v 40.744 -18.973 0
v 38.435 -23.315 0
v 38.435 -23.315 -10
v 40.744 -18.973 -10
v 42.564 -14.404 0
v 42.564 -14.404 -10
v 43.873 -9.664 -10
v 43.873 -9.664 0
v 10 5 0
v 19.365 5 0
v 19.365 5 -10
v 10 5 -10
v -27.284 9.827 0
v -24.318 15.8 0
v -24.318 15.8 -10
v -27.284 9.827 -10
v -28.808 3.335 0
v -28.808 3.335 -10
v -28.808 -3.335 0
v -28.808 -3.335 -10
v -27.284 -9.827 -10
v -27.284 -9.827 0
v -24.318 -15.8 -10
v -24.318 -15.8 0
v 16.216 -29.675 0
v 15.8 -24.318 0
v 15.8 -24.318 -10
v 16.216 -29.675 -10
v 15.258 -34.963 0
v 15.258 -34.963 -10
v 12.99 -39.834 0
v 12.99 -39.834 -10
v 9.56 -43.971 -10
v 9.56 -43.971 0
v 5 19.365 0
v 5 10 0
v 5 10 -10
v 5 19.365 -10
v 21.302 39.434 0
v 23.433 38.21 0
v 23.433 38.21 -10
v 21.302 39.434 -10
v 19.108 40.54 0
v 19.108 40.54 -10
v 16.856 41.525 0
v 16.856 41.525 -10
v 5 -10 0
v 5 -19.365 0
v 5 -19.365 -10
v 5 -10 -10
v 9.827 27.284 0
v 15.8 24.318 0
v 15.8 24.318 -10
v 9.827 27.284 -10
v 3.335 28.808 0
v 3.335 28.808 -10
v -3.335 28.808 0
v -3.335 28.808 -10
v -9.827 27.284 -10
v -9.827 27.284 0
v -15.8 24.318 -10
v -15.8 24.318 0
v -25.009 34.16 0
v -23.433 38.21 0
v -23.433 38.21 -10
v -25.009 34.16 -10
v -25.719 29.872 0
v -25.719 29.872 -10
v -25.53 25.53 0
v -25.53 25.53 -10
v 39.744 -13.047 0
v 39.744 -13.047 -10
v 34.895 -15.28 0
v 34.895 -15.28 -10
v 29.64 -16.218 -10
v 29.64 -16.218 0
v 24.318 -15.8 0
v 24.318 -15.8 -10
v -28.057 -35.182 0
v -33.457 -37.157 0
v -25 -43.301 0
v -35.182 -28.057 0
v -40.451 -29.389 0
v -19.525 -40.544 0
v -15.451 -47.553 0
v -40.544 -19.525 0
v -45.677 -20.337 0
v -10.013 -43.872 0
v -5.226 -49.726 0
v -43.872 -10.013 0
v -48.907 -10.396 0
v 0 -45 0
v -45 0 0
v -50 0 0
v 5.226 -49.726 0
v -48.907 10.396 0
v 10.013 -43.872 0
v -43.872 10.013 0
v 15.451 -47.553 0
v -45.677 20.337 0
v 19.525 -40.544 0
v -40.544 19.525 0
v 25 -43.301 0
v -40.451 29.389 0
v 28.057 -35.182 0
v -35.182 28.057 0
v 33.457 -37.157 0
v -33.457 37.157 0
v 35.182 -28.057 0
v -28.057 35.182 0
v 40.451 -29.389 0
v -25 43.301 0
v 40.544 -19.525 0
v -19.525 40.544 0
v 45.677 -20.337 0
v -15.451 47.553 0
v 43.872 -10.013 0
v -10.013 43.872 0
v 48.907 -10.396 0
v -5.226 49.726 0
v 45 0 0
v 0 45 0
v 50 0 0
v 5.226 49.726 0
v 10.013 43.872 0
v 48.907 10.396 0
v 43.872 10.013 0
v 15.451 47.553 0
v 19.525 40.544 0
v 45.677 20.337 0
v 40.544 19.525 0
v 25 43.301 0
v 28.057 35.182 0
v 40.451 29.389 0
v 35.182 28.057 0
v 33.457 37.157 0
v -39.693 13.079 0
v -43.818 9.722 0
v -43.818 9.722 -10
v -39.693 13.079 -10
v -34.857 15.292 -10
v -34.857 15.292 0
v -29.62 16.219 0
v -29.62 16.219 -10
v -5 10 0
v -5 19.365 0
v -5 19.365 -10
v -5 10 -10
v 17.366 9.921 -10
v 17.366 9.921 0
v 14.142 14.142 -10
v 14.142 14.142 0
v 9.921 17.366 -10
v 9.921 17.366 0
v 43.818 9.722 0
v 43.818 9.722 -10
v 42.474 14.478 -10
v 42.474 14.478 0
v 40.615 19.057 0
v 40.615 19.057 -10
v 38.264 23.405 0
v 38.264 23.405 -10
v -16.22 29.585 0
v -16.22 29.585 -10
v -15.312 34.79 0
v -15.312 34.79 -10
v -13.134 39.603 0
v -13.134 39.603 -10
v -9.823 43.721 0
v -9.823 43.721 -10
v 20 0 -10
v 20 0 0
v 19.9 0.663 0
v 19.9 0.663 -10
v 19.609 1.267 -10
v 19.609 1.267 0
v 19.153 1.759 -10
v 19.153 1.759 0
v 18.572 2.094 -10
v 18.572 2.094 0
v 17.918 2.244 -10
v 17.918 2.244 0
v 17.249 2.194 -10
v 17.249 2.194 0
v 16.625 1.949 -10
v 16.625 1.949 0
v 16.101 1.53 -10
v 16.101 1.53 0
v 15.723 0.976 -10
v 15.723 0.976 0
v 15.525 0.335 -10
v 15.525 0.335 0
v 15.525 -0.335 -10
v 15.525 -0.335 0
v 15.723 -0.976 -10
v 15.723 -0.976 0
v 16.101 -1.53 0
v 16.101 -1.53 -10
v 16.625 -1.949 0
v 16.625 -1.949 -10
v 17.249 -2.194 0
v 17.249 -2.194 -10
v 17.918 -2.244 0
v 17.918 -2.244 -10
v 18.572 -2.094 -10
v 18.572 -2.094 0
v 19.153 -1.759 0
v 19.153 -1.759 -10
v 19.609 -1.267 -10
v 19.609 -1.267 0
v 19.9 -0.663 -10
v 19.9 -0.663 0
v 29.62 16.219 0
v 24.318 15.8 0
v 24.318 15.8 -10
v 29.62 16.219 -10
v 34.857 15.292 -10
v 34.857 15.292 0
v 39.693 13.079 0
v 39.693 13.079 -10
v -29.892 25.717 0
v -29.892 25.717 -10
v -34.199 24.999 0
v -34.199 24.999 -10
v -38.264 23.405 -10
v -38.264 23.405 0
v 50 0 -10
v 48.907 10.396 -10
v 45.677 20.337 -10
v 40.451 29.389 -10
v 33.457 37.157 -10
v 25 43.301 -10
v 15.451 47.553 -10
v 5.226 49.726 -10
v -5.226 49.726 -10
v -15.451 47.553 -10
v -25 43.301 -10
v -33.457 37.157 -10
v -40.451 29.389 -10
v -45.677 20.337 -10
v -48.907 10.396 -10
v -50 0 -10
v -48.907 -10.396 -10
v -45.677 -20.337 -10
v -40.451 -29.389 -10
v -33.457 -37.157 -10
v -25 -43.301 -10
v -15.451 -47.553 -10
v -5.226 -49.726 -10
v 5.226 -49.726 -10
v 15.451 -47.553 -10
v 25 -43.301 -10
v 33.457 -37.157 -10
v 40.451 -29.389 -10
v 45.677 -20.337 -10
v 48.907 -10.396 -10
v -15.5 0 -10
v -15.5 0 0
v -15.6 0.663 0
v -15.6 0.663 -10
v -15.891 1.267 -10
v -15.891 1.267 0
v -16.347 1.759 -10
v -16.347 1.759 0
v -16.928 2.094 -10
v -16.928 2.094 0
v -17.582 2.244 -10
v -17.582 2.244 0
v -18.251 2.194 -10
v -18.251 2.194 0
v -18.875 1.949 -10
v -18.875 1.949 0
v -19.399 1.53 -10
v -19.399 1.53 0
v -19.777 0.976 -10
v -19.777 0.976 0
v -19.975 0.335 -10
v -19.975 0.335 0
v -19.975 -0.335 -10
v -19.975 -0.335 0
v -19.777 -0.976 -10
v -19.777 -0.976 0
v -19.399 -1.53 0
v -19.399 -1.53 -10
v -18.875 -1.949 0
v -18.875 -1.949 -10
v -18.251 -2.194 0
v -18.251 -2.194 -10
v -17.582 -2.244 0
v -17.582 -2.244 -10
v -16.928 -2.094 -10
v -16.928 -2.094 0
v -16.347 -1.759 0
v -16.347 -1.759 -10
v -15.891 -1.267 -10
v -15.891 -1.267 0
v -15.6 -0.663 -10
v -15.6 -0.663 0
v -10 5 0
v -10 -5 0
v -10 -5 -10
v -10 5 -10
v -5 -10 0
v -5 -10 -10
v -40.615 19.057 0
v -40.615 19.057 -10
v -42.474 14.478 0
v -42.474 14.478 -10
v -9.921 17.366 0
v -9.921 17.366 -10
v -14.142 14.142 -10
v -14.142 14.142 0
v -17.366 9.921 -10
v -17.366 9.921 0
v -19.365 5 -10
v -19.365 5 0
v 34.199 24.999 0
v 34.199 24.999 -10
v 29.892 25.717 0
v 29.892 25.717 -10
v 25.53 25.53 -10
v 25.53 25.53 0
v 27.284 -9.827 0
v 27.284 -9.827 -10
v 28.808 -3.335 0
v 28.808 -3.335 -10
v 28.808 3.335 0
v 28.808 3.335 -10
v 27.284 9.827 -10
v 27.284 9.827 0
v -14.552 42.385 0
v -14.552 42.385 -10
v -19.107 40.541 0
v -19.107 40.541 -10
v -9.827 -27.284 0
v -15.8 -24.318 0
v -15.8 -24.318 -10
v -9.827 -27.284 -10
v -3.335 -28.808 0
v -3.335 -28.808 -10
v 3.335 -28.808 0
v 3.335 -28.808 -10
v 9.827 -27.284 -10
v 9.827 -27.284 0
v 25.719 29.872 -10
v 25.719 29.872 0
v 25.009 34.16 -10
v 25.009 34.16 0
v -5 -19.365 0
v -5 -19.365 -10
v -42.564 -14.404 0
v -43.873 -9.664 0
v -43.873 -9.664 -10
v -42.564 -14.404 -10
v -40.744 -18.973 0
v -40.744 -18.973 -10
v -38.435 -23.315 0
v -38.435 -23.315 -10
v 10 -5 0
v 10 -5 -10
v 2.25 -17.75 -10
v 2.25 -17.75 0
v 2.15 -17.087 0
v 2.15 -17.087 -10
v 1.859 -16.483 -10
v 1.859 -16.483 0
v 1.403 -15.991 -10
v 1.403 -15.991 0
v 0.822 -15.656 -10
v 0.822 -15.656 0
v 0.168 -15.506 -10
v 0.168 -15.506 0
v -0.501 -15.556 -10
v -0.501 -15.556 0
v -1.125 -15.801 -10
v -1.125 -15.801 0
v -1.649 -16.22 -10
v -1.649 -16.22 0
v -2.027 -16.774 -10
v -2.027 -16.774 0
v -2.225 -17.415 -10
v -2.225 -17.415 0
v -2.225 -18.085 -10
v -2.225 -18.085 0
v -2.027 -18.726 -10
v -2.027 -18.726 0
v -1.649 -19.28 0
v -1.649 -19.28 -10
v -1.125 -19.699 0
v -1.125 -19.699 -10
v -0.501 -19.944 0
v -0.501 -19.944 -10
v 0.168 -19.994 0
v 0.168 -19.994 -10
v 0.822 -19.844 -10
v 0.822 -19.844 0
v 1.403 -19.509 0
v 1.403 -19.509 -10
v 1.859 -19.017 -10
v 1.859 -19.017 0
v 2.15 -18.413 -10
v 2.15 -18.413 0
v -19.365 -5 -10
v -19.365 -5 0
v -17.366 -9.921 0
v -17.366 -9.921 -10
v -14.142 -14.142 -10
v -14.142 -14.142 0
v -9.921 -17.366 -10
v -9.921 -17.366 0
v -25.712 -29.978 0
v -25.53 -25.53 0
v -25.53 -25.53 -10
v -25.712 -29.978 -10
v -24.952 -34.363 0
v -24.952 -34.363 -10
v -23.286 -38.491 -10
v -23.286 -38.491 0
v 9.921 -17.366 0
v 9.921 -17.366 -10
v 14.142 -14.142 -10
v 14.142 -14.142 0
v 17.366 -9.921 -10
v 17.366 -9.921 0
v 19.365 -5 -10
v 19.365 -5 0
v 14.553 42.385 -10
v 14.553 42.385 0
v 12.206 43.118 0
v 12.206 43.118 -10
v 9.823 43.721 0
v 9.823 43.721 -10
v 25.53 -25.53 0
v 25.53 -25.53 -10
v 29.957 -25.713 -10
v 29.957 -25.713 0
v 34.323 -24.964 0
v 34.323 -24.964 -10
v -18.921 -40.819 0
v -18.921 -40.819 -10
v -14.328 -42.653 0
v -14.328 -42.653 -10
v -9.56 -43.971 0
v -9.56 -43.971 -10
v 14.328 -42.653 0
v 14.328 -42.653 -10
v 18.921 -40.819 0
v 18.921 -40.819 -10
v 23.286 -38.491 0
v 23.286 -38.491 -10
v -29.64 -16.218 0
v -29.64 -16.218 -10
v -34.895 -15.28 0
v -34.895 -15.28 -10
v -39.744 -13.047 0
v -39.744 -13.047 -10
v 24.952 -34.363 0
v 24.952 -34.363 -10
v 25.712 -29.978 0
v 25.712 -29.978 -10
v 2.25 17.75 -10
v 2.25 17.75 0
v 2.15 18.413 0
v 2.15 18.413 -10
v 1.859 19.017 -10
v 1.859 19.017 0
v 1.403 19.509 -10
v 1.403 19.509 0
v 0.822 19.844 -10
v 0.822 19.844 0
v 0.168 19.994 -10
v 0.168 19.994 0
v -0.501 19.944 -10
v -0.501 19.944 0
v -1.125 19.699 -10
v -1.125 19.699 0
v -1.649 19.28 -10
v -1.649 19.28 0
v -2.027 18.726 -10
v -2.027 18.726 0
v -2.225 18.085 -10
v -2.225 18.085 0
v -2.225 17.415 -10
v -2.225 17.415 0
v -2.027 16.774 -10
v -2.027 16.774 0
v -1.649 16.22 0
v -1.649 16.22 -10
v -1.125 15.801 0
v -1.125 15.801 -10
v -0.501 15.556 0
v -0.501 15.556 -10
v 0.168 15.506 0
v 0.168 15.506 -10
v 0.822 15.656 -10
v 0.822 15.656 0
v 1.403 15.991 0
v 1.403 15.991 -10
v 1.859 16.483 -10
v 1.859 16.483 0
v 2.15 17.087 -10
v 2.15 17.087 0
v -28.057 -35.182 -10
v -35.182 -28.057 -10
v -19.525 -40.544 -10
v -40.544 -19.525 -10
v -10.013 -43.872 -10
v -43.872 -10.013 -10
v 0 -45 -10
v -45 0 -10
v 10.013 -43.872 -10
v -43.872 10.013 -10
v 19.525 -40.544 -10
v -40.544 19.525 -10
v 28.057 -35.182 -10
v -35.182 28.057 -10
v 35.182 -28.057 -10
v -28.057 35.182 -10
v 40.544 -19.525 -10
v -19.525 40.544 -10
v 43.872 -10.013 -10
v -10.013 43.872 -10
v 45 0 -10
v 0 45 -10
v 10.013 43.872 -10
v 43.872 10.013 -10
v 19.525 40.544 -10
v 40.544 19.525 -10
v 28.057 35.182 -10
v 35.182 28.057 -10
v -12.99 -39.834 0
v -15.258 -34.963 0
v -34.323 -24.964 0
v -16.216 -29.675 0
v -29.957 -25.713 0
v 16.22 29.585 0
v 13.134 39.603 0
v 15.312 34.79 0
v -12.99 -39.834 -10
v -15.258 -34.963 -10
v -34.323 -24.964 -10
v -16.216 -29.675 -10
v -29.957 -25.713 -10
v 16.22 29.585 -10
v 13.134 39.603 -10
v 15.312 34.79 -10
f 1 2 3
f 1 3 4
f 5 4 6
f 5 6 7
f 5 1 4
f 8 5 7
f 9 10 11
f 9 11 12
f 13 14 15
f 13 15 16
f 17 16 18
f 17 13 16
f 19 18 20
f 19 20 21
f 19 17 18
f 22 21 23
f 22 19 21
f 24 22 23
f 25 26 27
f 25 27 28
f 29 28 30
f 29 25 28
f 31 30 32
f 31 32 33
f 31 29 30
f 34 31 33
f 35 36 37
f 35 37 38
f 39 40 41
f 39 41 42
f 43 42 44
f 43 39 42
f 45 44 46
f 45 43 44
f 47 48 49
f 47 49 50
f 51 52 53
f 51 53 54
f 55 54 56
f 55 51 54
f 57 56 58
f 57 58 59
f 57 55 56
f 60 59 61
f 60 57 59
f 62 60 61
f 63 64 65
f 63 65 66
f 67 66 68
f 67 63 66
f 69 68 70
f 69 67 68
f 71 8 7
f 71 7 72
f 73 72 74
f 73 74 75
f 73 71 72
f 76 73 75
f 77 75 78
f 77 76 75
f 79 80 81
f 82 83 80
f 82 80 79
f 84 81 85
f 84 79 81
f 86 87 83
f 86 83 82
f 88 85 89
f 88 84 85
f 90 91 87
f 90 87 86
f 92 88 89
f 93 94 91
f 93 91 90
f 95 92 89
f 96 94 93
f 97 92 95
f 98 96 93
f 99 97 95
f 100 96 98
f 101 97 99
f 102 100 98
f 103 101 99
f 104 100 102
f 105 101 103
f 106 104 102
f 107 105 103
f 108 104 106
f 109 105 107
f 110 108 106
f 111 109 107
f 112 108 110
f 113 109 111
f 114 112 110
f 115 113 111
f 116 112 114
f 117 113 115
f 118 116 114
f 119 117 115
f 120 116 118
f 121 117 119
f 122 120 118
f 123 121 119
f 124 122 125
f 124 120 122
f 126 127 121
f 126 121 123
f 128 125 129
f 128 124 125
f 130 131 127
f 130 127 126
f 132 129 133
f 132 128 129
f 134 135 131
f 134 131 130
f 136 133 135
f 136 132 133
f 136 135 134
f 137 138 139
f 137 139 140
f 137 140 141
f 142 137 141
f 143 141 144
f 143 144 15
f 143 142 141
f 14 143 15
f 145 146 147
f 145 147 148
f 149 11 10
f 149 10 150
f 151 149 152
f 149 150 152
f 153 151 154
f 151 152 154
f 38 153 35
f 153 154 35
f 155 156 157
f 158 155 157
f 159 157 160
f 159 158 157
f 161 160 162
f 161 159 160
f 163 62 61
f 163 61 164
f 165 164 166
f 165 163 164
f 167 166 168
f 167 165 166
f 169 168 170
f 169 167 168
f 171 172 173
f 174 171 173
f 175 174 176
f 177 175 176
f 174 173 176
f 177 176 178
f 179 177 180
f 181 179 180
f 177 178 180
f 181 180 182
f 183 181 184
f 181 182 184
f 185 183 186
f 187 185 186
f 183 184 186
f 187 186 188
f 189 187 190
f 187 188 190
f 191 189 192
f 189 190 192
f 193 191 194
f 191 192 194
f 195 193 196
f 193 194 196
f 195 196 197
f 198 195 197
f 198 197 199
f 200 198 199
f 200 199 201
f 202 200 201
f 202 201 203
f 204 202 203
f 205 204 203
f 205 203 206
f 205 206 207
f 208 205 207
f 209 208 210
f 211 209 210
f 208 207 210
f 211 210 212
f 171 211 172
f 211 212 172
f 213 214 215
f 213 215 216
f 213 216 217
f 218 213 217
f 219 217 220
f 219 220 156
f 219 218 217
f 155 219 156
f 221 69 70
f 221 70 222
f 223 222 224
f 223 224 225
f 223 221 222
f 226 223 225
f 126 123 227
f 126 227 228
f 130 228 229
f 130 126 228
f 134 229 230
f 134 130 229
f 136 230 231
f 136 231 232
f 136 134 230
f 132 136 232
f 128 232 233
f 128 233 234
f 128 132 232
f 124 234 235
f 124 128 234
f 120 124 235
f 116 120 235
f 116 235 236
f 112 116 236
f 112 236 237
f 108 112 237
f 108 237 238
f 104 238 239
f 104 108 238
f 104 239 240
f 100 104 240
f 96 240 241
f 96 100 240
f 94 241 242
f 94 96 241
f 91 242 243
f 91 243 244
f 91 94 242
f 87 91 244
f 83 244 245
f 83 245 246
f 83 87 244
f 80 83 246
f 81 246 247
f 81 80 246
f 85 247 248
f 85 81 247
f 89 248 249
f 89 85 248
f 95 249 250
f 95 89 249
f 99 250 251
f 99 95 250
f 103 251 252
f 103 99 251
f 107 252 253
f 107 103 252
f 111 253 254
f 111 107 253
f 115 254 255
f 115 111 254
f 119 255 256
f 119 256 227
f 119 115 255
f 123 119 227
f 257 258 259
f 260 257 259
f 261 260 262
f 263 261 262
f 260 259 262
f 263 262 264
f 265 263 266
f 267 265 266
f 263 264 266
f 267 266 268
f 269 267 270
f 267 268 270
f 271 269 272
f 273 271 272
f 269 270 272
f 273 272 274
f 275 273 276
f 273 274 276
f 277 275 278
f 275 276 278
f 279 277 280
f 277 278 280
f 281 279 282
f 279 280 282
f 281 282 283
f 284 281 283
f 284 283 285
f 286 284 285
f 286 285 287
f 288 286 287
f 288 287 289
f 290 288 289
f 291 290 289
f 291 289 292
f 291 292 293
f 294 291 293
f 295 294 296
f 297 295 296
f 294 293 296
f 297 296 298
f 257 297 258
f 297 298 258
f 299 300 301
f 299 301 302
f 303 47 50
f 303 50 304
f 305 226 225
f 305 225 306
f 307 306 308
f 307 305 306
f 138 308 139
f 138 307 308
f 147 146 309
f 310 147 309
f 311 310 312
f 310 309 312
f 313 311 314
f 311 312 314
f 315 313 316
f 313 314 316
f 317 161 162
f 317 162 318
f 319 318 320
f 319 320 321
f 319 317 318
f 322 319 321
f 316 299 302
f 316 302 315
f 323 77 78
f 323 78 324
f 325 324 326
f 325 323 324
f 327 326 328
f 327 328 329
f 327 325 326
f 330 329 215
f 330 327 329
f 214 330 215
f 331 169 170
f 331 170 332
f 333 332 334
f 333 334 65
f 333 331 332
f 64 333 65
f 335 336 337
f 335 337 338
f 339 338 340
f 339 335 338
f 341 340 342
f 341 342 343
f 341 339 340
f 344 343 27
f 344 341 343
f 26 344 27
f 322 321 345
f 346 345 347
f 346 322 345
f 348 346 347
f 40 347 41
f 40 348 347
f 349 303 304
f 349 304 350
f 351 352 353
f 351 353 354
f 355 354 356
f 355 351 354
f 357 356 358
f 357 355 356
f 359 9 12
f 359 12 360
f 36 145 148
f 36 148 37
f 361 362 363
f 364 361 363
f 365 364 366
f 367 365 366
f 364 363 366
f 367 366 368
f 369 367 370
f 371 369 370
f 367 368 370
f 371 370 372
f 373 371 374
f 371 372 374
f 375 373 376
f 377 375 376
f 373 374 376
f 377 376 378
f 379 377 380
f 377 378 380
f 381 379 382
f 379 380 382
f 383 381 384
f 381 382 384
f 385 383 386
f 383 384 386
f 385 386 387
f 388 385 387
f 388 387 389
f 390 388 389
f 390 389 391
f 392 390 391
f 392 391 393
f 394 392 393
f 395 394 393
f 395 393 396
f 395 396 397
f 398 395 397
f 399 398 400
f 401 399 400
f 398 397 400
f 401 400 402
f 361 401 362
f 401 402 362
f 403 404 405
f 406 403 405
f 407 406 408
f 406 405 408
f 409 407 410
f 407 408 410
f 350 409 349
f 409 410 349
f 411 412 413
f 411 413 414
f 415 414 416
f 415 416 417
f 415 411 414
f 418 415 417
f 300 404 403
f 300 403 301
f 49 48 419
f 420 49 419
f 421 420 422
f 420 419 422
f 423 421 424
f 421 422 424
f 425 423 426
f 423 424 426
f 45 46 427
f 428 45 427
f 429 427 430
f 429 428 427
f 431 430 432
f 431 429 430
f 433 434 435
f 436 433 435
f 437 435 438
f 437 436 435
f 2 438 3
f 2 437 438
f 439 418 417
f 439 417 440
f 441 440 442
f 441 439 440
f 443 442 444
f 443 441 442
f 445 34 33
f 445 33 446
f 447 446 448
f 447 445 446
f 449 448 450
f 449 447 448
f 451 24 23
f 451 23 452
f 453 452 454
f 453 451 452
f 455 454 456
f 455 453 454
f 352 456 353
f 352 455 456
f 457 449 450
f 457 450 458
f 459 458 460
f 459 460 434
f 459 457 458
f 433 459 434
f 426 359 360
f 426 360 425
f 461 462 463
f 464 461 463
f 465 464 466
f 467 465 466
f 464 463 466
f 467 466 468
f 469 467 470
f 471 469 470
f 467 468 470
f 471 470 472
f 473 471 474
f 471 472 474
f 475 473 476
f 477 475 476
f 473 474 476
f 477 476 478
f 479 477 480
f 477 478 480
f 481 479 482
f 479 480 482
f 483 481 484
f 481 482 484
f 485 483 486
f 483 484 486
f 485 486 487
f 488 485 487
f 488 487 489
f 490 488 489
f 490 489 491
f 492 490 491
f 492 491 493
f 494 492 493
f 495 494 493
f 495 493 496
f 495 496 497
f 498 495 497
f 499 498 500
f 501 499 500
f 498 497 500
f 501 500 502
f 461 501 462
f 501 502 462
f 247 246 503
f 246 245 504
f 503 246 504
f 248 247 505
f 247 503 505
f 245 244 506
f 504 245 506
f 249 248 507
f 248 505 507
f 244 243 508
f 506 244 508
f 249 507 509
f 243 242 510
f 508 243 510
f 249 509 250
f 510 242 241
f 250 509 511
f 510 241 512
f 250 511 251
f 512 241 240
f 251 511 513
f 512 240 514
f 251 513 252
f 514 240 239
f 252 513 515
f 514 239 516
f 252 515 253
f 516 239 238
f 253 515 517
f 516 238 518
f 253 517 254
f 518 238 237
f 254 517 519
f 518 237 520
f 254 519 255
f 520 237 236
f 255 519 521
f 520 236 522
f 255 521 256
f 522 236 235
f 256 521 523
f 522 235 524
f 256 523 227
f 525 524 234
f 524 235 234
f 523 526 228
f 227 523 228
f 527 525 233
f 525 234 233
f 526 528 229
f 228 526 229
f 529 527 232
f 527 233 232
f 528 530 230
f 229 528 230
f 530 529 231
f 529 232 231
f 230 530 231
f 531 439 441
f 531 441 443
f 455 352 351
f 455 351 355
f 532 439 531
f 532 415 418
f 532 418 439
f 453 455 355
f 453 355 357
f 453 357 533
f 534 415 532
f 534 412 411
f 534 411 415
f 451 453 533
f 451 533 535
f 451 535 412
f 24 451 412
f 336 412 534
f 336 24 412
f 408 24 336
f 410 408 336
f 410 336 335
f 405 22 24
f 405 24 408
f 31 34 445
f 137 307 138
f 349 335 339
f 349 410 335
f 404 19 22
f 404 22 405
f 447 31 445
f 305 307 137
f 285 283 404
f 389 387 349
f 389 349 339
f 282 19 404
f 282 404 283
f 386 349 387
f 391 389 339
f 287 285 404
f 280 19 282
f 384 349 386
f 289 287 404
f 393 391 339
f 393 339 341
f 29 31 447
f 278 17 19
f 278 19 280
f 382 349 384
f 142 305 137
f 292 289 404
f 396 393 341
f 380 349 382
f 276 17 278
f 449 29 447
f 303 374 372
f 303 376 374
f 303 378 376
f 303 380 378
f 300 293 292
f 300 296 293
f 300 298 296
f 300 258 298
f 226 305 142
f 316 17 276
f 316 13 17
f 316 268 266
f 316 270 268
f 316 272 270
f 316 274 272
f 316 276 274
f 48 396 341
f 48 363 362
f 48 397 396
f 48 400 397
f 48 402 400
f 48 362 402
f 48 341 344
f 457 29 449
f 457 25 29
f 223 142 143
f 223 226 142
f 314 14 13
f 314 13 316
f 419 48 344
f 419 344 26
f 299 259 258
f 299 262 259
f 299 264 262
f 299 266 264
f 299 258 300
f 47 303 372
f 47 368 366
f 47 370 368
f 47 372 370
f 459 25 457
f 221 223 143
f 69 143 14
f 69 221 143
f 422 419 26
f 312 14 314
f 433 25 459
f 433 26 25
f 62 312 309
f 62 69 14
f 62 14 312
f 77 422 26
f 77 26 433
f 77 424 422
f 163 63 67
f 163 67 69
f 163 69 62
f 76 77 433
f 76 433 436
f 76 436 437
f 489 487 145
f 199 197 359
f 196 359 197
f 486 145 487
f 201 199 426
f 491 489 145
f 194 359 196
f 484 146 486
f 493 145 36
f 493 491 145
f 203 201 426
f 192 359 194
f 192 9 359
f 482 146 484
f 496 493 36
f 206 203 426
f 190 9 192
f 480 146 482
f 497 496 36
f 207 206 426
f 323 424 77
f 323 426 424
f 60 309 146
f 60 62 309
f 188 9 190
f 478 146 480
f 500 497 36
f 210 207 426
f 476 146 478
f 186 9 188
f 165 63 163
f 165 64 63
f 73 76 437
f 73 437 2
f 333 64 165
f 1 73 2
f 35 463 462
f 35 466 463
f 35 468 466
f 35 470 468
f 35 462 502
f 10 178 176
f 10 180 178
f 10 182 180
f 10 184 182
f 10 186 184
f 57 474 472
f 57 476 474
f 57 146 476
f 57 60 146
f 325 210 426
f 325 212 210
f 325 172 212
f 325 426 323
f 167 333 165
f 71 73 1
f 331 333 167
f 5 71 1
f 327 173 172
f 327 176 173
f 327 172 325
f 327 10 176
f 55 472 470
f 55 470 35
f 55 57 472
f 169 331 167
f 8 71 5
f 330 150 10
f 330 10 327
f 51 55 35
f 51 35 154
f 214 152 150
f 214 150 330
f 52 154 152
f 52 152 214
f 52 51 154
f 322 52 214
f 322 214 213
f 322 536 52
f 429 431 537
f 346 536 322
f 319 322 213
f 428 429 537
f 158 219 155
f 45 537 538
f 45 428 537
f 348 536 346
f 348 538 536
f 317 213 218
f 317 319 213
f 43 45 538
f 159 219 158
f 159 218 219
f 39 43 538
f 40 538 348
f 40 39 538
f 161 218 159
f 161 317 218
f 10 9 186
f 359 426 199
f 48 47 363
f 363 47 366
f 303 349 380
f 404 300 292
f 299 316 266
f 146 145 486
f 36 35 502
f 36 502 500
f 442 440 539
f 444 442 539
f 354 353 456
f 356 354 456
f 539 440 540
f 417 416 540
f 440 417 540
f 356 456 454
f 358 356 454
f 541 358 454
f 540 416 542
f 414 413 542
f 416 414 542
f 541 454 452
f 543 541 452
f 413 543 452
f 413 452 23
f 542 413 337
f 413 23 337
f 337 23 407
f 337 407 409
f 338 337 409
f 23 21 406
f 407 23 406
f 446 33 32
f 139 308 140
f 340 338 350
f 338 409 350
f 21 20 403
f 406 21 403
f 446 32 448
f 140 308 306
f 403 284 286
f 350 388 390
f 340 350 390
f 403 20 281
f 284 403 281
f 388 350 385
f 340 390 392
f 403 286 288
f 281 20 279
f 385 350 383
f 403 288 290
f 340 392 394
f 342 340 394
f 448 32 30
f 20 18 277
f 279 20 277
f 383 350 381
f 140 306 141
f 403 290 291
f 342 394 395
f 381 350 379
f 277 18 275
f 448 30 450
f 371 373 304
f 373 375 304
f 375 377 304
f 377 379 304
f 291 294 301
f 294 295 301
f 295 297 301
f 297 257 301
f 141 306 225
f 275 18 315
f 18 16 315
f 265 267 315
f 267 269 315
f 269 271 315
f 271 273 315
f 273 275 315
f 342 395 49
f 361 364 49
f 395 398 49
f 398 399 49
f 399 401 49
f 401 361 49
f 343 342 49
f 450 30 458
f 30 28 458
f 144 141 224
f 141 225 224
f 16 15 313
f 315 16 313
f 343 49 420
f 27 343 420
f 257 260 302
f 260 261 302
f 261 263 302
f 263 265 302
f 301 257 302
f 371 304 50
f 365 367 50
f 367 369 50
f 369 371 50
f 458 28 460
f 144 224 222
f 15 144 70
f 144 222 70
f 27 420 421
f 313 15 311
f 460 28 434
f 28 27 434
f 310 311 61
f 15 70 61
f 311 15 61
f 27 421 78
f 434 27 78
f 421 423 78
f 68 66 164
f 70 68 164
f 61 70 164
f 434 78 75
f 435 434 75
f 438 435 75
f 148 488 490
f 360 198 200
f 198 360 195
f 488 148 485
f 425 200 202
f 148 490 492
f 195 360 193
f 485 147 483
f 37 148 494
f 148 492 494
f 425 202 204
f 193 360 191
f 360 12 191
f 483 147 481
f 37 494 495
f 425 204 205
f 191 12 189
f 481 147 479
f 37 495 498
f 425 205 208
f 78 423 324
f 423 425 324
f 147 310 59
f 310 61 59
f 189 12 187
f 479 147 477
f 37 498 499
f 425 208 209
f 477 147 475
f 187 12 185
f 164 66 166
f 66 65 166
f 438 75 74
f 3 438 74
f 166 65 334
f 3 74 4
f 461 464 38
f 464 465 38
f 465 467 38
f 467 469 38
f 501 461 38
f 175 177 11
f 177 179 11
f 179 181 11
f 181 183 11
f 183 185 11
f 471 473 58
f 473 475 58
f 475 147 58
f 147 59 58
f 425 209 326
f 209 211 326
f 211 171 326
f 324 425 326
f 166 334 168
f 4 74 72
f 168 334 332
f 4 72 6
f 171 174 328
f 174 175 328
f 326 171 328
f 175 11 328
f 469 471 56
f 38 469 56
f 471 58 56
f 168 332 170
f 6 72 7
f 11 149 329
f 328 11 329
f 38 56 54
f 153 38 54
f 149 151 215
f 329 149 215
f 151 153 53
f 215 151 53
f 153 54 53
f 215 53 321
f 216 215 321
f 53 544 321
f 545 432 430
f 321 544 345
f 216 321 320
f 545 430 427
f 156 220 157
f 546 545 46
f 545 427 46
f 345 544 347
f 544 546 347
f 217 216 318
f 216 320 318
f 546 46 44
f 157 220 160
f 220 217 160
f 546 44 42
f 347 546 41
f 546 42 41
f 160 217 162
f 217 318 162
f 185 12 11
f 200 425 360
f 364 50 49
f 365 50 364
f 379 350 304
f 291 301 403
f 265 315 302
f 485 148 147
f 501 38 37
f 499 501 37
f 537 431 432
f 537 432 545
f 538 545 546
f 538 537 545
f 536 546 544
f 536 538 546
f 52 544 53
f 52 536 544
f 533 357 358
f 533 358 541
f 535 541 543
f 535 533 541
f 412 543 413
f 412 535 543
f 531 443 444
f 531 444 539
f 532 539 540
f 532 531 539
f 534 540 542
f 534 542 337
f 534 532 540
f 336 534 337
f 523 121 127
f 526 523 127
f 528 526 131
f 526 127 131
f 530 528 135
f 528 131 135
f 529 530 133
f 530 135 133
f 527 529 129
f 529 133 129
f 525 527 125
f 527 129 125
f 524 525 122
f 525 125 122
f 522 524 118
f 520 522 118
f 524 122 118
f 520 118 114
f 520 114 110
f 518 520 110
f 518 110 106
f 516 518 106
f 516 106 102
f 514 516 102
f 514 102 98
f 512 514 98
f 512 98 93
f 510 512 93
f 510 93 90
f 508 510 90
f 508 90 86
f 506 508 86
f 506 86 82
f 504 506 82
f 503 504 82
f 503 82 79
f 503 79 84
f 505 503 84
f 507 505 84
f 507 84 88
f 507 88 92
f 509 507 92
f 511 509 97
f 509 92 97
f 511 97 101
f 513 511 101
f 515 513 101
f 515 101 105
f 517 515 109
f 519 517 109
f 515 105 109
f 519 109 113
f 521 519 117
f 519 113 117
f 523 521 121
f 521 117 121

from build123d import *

# Parameters (mm, degrees)
SKETCH6_R                    = 29
SKETCH6_R_2                  = 20
INNER_RING_DEPTH             = 10
MOTOR_CONNECTOR_CUT_DEPTH    = 10
SKETCH9_R                    = 50
SKETCH9_R_2                  = 29
OUTSIDE_RING_EXTRUSION_DEPTH = 10
SKETCH12_R                   = 45
SKETCH12_R_2                 = 27.5
CUT_EXTRUDE6_DEPTH           = 55
SKETCH8_R                    = 2.25
MOTOR_CONNECTOR_HOLES_DEPTH  = 10
SKETCH10_R                   = 27.404299948
BOSS_EXTRUDE4_DEPTH          = 10


with BuildPart() as part:
    # Sketch6 → Inner Ring (new body)
    with BuildSketch(Plane.XY):
        Circle(SKETCH6_R)
        Circle(SKETCH6_R_2, mode=Mode.SUBTRACT)
    extrude(amount=-INNER_RING_DEPTH)

    # Sketch7 → Motor Connector Cut (add)
    with BuildSketch(Plane.XY):
        with BuildLine():
            ThreePointArc((20, 0), (19.840593925, 2.52008585), (19.364916731, 5))
            Line((19.364916731, 5), (9.999996731, 5))
            Line((9.999996731, 5), (9.999996731, -5))
            Line((9.999996731, -5), (19.364916731, -5))
            ThreePointArc((19.364916731, -5), (19.840593925, -2.52008585), (20, 0))
        make_face()
        with BuildLine():
            ThreePointArc((5, 19.364916731), (0, 20), (-5, 19.364916731))
            Line((-5, 19.364916731), (-5, 9.999996731))
            Line((-5, 9.999996731), (5, 9.999996731))
            Line((5, 9.999996731), (5, 19.364916731))
        make_face()
        with BuildLine():
            Line((-9.999996731, -5), (-9.999996731, 5))
            Line((-9.999996731, 5), (-19.364916731, 5))
            ThreePointArc((-19.364916731, 5), (-20, 0), (-19.364916731, -5))
            Line((-19.364916731, -5), (-9.999996731, -5))
        make_face()
        with BuildLine():
            Line((-5, -9.999996731), (-5, -19.364916731))
            ThreePointArc((-5, -19.364916731), (0, -20), (5, -19.364916731))
            Line((5, -19.364916731), (5, -9.999996731))
            Line((5, -9.999996731), (-5, -9.999996731))
        make_face()
    extrude(amount=-MOTOR_CONNECTOR_CUT_DEPTH)

    # Sketch9 → Outside Ring Extrusion (add)
    with BuildSketch(Plane.XY):
        Circle(SKETCH9_R)
        Circle(SKETCH9_R_2, mode=Mode.SUBTRACT)
    extrude(amount=-OUTSIDE_RING_EXTRUSION_DEPTH)

    # Sketch12 → Cut-Extrude6 (cut)
    with BuildSketch(Plane.XY):
        Circle(SKETCH12_R)
        Circle(SKETCH12_R_2, mode=Mode.SUBTRACT)
    extrude(amount=-CUT_EXTRUDE6_DEPTH, mode=Mode.SUBTRACT)

    # Sketch8 → Motor Connector Holes (cut)
    with BuildSketch(Plane.XY):
        with Locations((0, 17.75)):
            Circle(SKETCH8_R)
        with Locations((17.75, 0)):
            Circle(SKETCH8_R)
        with Locations((0, -17.75)):
            Circle(SKETCH8_R)
        with Locations((-17.75, 0)):
            Circle(SKETCH8_R)
    extrude(amount=-MOTOR_CONNECTOR_HOLES_DEPTH, mode=Mode.SUBTRACT)

    # Sketch10 → Boss-Extrude4 (add)
    with BuildSketch(Plane.XY):
        with BuildLine():
            ThreePointArc((24.317625284, 15.800414568), (34.856582319, 15.291767932), (43.817916626, 9.721954269))
            ThreePointArc((43.817916626, 9.721954269), (41.607188912, 16.793289988), (38.263814419, 23.404867172))
            ThreePointArc((38.263814419, 23.404867172), (32.064348025, 25.470287935), (25.530148518, 25.530148518))
            ThreePointArc((25.530148518, 25.530148518), (25.475284033, 32.034279432), (23.432821057, 38.209639668))
            ThreePointArc((23.432821057, 38.209639668), (20.212556871, 40.002288656), (16.856128399, 41.524812789))
            ThreePointArc((16.856128399, 41.524812789), (13.384732217, 42.767397097), (9.823095744, 43.720997037))
            ThreePointArc((9.823095744, 43.720997037), (15.312499865, 34.789679765), (15.800414568, 24.317625284))
            ThreePointArc((15.800414568, 24.317625284), (0, 29), (-15.800414568, 24.317625284))
            ThreePointArc((-15.800414568, 24.317625284), (-15.312499865, 34.789679765), (-9.823095744, 43.720997037))
            ThreePointArc((-9.823095744, 43.720997037), (-16.854754984, 41.52536899), (-23.432821057, 38.209639668))
            ThreePointArc((-23.432821057, 38.209639668), (-25.475284033, 32.034279432), (-25.530148518, 25.530148518))
            ThreePointArc((-25.530148518, 25.530148518), (-32.064348025, 25.470287935), (-38.263814419, 23.404867172))
            ThreePointArc((-38.263814419, 23.404867172), (-41.607188912, 16.793289988), (-43.817916626, 9.721954269))
            ThreePointArc((-43.817916626, 9.721954269), (-34.856582319, 15.291767932), (-24.317625284, 15.800414568))
            ThreePointArc((-24.317625284, 15.800414568), (-29, 0), (-24.317625284, -15.800414568))
            ThreePointArc((-24.317625284, -15.800414568), (-34.894848495, -15.279799844), (-43.87309253, -9.663767027))
            ThreePointArc((-43.87309253, -9.663767027), (-41.716263612, -16.713446711), (-38.435015504, -23.315212041))
            ThreePointArc((-38.435015504, -23.315212041), (-32.159621016, -25.454161245), (-25.530148518, -25.530148518))
            ThreePointArc((-25.530148518, -25.530148518), (-25.448803812, -32.190695038), (-23.285614603, -38.490703716))
            ThreePointArc((-23.285614603, -38.490703716), (-16.649731385, -41.799208281), (-9.559859326, -43.970581744))
            ThreePointArc((-9.559859326, -43.970581744), (-15.258354287, -34.962784804), (-15.800414568, -24.317625284))
            ThreePointArc((-15.800414568, -24.317625284), (0, -29), (15.800414568, -24.317625284))
            ThreePointArc((15.800414568, -24.317625284), (15.258354287, -34.962784804), (9.559859326, -43.970581744))
            ThreePointArc((9.559859326, -43.970581744), (16.649731385, -41.799208281), (23.285614603, -38.490703716))
            ThreePointArc((23.285614603, -38.490703716), (25.448803812, -32.190695038), (25.530148518, -25.530148518))
            ThreePointArc((25.530148518, -25.530148518), (32.159621016, -25.454161245), (38.435015504, -23.315212041))
            ThreePointArc((38.435015504, -23.315212041), (41.716263612, -16.713446711), (43.87309253, -9.663767027))
            ThreePointArc((43.87309253, -9.663767027), (34.894848495, -15.279799844), (24.317625284, -15.800414568))
            ThreePointArc((24.317625284, -15.800414568), (29, 0), (24.317625284, 15.800414568))
        make_face()
        with Locations((-0.095700052, 0)):
            Circle(SKETCH10_R, mode=Mode.SUBTRACT)
    extrude(amount=-BOSS_EXTRUDE4_DEPTH)


solid = part.part
